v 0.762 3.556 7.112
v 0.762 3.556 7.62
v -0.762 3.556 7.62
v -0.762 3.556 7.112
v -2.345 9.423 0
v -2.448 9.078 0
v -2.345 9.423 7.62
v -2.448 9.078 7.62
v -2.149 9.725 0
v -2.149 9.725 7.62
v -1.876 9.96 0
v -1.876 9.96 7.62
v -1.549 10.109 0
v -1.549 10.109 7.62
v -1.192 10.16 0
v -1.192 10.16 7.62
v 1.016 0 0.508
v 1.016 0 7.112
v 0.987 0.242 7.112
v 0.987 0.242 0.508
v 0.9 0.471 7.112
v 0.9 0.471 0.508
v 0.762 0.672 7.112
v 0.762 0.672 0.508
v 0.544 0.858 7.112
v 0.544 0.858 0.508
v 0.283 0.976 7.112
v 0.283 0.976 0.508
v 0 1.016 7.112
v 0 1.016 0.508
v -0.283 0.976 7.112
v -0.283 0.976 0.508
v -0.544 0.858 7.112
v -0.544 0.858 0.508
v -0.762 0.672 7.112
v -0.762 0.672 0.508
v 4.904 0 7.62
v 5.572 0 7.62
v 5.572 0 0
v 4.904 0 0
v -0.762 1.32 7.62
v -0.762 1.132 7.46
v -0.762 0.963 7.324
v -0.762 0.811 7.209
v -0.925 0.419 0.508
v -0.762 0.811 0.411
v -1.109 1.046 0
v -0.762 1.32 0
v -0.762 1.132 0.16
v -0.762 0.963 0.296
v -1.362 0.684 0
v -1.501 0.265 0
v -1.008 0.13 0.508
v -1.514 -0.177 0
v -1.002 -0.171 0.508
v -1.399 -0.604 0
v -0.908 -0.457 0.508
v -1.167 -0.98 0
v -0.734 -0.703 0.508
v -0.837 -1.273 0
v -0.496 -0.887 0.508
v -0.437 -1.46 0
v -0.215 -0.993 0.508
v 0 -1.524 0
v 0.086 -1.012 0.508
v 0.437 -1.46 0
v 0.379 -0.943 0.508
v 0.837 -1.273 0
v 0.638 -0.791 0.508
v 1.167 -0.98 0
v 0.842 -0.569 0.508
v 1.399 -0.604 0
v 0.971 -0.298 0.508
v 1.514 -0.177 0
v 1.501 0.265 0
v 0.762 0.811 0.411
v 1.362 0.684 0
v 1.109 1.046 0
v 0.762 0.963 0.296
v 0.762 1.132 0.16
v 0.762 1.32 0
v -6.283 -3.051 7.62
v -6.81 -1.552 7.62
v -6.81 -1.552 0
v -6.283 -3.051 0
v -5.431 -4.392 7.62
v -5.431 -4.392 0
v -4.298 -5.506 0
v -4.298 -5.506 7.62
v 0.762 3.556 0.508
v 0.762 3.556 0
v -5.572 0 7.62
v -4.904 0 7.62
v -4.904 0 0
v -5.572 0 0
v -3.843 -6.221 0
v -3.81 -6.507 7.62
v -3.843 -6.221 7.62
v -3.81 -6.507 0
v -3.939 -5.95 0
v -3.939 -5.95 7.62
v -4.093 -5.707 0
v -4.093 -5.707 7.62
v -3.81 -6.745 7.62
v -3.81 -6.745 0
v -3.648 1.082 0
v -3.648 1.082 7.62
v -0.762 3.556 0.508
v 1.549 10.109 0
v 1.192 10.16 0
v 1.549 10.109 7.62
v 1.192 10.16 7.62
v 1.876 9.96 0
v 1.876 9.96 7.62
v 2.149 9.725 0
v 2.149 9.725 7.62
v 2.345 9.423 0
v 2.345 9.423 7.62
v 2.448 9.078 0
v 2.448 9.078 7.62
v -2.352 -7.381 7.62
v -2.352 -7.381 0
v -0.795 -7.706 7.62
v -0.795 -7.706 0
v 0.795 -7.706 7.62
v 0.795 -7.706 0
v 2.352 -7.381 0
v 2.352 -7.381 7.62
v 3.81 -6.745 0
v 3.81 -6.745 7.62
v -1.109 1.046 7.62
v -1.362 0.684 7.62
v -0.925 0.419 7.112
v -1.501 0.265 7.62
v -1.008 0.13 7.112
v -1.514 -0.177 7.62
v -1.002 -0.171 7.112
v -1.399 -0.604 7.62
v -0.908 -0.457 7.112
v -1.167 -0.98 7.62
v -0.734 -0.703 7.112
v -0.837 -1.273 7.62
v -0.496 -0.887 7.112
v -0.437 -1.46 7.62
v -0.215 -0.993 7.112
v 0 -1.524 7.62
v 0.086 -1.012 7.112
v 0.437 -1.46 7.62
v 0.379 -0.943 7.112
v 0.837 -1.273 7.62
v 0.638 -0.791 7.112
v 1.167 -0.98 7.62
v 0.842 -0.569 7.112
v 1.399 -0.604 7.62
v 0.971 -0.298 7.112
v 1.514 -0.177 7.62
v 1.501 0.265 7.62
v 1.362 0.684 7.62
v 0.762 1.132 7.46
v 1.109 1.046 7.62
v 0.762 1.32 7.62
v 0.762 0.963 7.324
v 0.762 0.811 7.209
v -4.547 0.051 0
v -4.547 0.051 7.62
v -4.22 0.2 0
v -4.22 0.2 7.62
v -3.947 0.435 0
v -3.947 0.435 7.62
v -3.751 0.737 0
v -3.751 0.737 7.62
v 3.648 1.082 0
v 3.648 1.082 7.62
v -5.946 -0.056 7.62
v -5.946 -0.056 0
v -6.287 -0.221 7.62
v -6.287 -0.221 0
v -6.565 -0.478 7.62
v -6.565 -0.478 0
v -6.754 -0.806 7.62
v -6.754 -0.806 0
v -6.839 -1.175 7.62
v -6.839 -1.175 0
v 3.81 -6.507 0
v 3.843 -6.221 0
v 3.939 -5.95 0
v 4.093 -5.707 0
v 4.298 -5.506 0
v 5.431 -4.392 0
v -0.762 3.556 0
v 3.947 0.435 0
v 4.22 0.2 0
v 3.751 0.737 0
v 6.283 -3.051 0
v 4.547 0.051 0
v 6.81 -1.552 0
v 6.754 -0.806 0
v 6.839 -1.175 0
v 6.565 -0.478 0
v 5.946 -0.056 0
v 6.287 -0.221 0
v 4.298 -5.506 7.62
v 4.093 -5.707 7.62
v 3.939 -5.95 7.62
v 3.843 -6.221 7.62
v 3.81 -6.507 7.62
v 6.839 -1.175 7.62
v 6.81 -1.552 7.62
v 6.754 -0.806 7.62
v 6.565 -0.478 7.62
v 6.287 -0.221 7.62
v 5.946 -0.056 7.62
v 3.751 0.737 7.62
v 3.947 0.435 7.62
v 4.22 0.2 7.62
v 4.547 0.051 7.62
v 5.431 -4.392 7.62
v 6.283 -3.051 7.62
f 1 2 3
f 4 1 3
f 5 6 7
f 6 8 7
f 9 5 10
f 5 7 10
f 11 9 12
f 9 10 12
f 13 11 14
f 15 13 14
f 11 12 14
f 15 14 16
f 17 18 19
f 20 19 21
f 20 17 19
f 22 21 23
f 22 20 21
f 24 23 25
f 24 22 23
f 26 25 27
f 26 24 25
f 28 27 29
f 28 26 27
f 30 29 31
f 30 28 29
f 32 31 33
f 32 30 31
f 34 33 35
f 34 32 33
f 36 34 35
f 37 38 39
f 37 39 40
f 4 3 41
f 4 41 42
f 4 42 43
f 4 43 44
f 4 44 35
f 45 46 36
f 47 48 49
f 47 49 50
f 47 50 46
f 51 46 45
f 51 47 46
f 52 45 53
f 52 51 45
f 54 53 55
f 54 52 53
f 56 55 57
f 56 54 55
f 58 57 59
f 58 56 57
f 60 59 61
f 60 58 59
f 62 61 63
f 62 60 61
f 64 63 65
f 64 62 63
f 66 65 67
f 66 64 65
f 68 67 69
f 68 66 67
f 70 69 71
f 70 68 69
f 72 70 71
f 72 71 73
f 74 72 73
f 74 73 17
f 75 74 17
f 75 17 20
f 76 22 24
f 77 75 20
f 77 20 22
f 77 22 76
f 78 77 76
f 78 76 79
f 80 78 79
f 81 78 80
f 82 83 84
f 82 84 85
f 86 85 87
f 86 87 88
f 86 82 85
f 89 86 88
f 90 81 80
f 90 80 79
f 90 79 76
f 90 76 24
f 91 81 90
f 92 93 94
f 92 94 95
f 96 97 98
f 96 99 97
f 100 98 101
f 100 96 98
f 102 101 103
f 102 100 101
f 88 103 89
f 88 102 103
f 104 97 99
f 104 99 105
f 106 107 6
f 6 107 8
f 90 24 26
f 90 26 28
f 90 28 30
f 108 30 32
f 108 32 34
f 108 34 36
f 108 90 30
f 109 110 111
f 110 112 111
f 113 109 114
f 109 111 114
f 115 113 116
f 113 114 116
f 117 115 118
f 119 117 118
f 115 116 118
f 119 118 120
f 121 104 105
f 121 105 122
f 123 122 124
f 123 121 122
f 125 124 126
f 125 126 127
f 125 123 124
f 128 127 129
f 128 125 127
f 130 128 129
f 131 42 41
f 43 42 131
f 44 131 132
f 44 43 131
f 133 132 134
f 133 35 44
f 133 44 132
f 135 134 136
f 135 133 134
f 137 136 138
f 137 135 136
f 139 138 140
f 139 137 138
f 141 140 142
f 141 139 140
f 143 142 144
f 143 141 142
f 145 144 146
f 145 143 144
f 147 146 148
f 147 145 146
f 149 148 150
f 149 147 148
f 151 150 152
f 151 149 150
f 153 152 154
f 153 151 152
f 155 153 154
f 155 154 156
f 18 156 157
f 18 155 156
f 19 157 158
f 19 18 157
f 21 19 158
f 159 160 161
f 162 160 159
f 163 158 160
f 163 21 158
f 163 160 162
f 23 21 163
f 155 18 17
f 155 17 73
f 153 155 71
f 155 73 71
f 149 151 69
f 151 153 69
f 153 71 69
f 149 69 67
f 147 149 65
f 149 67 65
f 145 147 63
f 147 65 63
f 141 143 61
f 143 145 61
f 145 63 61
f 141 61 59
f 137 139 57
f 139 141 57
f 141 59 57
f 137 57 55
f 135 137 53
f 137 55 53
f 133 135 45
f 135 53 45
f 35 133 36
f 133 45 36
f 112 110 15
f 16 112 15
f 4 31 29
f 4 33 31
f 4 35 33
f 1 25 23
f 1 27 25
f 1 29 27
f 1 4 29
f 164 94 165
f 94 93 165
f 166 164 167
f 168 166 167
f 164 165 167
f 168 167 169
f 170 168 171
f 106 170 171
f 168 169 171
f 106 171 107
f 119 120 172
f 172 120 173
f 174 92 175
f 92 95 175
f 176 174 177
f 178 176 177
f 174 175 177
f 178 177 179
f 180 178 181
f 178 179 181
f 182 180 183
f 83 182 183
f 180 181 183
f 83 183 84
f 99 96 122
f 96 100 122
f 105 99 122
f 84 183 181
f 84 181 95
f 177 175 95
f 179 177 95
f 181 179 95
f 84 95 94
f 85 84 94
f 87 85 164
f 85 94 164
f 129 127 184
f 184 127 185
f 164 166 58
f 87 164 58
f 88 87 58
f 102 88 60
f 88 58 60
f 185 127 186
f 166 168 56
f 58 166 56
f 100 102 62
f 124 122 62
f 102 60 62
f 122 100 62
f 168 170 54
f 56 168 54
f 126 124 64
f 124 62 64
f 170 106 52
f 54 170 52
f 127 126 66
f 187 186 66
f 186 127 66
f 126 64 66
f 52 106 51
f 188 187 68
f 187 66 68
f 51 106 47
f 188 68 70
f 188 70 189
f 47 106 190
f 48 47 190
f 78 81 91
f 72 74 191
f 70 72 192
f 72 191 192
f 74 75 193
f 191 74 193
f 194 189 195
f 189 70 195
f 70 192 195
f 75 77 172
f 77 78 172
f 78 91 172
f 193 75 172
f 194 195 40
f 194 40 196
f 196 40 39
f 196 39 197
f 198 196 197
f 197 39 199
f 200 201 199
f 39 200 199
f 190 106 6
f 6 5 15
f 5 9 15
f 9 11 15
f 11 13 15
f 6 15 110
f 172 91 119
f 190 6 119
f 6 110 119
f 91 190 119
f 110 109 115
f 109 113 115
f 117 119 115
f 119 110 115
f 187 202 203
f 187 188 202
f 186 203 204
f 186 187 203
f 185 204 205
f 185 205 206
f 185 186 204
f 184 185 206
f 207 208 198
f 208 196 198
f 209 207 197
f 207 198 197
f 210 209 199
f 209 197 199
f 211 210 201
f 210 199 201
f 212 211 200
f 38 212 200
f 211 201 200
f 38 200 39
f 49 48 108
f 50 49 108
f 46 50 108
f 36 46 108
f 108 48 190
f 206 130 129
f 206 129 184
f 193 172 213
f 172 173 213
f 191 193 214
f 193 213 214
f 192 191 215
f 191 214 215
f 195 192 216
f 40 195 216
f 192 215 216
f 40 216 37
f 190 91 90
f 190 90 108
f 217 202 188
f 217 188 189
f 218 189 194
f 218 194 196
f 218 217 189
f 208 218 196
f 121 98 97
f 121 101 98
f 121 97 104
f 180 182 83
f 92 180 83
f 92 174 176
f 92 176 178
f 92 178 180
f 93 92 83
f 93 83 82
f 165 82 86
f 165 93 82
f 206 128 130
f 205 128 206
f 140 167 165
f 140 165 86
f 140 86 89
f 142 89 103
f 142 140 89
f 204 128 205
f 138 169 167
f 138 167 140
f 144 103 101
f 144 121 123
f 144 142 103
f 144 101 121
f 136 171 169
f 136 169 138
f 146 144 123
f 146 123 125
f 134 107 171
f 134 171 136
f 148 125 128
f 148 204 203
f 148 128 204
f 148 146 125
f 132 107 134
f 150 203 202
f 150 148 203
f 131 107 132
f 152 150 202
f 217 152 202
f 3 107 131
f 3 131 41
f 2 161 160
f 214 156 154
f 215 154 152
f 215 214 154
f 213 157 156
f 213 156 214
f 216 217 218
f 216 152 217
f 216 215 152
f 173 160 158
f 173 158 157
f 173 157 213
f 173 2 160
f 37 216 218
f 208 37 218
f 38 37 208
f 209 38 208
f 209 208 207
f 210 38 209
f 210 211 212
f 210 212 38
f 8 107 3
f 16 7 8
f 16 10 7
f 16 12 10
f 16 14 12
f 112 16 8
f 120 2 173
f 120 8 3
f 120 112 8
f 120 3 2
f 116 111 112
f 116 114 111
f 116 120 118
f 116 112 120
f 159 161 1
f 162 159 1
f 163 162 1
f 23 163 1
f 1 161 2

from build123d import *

# Parameters (mm, degrees)
BOSS_EXTRUDE2_DEPTH  = 7.62
CUT_EXTRUDE1_DEPTH   = 0.508
SKETCH4_W            = 1.524
SKETCH4_H            = 3.556
CUT_EXTRUDE2_DEPTH   = 0.508
BOSS_EXTRUDE8_DEPTH  = 7.62
BOSS_EXTRUDE10_DEPTH = 7.62
FILLET2_R            = 1.27
CUT_EXTRUDE4_DEPTH   = 7.62
FILLET4_R            = 1.27


with BuildPart() as part:
    # Sketch2 → Boss-Extrude2 (new body)
    with BuildSketch(Plane.XY):
        with BuildLine():
            ThreePointArc((-3.81, 0), (0, -3.81), (3.81, 0))
            Line((3.81, 0), (3.81, 8.636))
            ThreePointArc((3.81, 8.636), (3.363630735, 9.713630735), (2.286, 10.16))
            Line((2.286, 10.16), (-2.286, 10.16))
            ThreePointArc((-2.286, 10.16), (-3.363630735, 9.713630735), (-3.81, 8.636))
            Line((-3.81, 8.636), (-3.81, 0))
        make_face()
        with BuildLine():
            Line((-0.762, 0), (1.016, 0))
            ThreePointArc((1.016, 0), (-0.359210245, -0.950380976), (-0.762, 0.672020833))
            Line((-0.762, 0.672020833), (-0.762, 0))
        make_face(mode=Mode.SUBTRACT)
    extrude(amount=BOSS_EXTRUDE2_DEPTH)

    # Sketch3 → Cut-Extrude1 (cut)
    with BuildSketch(Plane.XY.offset(7.62)):
        with BuildLine():
            Line((-0.762, 0), (1.016, 0))
            ThreePointArc((1.016, 0), (0.950380976, 0.359210245), (0.762, 0.672020833))
            Line((0.762, 0.672020833), (0.762, 3.556))
            Line((0.762, 3.556), (-0.762, 3.556))
            Line((-0.762, 3.556), (-0.762, 0))
        make_face()
    extrude(amount=-CUT_EXTRUDE1_DEPTH, mode=Mode.SUBTRACT)

    # Sketch4 → Cut-Extrude2 (cut)
    with BuildSketch(Plane(origin=(0, 0, 0), x_dir=(-1, 0, 0), z_dir=(0, 0, -1))):
        with Locations((0, 1.778)):
            Rectangle(SKETCH4_W, SKETCH4_H)
    extrude(amount=-CUT_EXTRUDE2_DEPTH, mode=Mode.SUBTRACT)

    # Sketch7 → Cut-Revolve1 (revolve, cut)
    with BuildSketch(Plane(origin=(0, 0, 0), x_dir=(1, 0, 0), z_dir=(0, 1, 0))):
        Polygon((0, 0), (0, -7.62), (1.524, -7.62), (1.016, -7.112), (1.016, -0.508), (1.524, 0), align=None)
    revolve(axis=Axis((0, 0, 0), (0, 0, 1)), mode=Mode.SUBTRACT)

    # Sketch10 → Boss-Extrude8 (add)
    with BuildSketch(Plane.XY.offset(7.62)):
        with BuildLine():
            Line((-3.81, 0), (-6.985, 0))
            ThreePointArc((-6.985, 0), (0, -6.985), (6.985, 0))
            Line((6.985, 0), (3.81, 0))
            ThreePointArc((3.81, 0), (0, -3.81), (-3.81, 0))
        make_face()
    extrude(amount=-BOSS_EXTRUDE8_DEPTH)

    # Sketch14 → Boss-Extrude10 (add)
    with BuildSketch(Plane.XY.offset(7.62)):
        with BuildLine():
            ThreePointArc((3.81, -5.85441073), (0, -6.985), (-3.81, -5.85441073))
            Line((-3.81, -5.85441073), (-3.81, -6.745362036))
            ThreePointArc((-3.81, -6.745362036), (0, -7.747), (3.81, -6.745362036))
            Line((3.81, -6.745362036), (3.81, -5.85441073))
        make_face()
    extrude(amount=-BOSS_EXTRUDE10_DEPTH)

    # Fillet2
    fillet2_edges = [part.edges().sort_by_distance(p)[0] for p in [
        (-6.985, 0, 3.81),
        (6.985, 0, 3.81),
    ]]
    fillet(fillet2_edges, radius=FILLET2_R)

    # Sketch16 → Cut-Extrude4 (cut)
    with BuildSketch(Plane.XY.offset(7.62)):
        with BuildLine():
            Line((-3.81, 0), (-2.286, 10.16))
            ThreePointArc((-2.286, 10.16), (-3.363630735, 9.713630735), (-3.81, 8.636))
            Line((-3.81, 8.636), (-3.81, 0))
        make_face()
        with BuildLine():
            Line((2.286, 10.16), (3.81, 0))
            Line((3.81, 0), (3.81, 8.636))
            ThreePointArc((3.81, 8.636), (3.363630735, 9.713630735), (2.286, 10.16))
        make_face()
    extrude(amount=-CUT_EXTRUDE4_DEPTH, mode=Mode.SUBTRACT)

    # Fillet4
    fillet4_edges = [part.edges().sort_by_distance(p)[0] for p in [
        (-3.81, -5.85441073, 3.81),
        (3.81, -5.85441073, 3.81),
        (-3.81, 0, 3.81),
        (-2.286, 10.16, 3.81),
        (2.286, 10.16, 3.81),
        (3.81, 0, 3.81),
    ]]
    fillet(fillet4_edges, radius=FILLET4_R)


solid = part.part
